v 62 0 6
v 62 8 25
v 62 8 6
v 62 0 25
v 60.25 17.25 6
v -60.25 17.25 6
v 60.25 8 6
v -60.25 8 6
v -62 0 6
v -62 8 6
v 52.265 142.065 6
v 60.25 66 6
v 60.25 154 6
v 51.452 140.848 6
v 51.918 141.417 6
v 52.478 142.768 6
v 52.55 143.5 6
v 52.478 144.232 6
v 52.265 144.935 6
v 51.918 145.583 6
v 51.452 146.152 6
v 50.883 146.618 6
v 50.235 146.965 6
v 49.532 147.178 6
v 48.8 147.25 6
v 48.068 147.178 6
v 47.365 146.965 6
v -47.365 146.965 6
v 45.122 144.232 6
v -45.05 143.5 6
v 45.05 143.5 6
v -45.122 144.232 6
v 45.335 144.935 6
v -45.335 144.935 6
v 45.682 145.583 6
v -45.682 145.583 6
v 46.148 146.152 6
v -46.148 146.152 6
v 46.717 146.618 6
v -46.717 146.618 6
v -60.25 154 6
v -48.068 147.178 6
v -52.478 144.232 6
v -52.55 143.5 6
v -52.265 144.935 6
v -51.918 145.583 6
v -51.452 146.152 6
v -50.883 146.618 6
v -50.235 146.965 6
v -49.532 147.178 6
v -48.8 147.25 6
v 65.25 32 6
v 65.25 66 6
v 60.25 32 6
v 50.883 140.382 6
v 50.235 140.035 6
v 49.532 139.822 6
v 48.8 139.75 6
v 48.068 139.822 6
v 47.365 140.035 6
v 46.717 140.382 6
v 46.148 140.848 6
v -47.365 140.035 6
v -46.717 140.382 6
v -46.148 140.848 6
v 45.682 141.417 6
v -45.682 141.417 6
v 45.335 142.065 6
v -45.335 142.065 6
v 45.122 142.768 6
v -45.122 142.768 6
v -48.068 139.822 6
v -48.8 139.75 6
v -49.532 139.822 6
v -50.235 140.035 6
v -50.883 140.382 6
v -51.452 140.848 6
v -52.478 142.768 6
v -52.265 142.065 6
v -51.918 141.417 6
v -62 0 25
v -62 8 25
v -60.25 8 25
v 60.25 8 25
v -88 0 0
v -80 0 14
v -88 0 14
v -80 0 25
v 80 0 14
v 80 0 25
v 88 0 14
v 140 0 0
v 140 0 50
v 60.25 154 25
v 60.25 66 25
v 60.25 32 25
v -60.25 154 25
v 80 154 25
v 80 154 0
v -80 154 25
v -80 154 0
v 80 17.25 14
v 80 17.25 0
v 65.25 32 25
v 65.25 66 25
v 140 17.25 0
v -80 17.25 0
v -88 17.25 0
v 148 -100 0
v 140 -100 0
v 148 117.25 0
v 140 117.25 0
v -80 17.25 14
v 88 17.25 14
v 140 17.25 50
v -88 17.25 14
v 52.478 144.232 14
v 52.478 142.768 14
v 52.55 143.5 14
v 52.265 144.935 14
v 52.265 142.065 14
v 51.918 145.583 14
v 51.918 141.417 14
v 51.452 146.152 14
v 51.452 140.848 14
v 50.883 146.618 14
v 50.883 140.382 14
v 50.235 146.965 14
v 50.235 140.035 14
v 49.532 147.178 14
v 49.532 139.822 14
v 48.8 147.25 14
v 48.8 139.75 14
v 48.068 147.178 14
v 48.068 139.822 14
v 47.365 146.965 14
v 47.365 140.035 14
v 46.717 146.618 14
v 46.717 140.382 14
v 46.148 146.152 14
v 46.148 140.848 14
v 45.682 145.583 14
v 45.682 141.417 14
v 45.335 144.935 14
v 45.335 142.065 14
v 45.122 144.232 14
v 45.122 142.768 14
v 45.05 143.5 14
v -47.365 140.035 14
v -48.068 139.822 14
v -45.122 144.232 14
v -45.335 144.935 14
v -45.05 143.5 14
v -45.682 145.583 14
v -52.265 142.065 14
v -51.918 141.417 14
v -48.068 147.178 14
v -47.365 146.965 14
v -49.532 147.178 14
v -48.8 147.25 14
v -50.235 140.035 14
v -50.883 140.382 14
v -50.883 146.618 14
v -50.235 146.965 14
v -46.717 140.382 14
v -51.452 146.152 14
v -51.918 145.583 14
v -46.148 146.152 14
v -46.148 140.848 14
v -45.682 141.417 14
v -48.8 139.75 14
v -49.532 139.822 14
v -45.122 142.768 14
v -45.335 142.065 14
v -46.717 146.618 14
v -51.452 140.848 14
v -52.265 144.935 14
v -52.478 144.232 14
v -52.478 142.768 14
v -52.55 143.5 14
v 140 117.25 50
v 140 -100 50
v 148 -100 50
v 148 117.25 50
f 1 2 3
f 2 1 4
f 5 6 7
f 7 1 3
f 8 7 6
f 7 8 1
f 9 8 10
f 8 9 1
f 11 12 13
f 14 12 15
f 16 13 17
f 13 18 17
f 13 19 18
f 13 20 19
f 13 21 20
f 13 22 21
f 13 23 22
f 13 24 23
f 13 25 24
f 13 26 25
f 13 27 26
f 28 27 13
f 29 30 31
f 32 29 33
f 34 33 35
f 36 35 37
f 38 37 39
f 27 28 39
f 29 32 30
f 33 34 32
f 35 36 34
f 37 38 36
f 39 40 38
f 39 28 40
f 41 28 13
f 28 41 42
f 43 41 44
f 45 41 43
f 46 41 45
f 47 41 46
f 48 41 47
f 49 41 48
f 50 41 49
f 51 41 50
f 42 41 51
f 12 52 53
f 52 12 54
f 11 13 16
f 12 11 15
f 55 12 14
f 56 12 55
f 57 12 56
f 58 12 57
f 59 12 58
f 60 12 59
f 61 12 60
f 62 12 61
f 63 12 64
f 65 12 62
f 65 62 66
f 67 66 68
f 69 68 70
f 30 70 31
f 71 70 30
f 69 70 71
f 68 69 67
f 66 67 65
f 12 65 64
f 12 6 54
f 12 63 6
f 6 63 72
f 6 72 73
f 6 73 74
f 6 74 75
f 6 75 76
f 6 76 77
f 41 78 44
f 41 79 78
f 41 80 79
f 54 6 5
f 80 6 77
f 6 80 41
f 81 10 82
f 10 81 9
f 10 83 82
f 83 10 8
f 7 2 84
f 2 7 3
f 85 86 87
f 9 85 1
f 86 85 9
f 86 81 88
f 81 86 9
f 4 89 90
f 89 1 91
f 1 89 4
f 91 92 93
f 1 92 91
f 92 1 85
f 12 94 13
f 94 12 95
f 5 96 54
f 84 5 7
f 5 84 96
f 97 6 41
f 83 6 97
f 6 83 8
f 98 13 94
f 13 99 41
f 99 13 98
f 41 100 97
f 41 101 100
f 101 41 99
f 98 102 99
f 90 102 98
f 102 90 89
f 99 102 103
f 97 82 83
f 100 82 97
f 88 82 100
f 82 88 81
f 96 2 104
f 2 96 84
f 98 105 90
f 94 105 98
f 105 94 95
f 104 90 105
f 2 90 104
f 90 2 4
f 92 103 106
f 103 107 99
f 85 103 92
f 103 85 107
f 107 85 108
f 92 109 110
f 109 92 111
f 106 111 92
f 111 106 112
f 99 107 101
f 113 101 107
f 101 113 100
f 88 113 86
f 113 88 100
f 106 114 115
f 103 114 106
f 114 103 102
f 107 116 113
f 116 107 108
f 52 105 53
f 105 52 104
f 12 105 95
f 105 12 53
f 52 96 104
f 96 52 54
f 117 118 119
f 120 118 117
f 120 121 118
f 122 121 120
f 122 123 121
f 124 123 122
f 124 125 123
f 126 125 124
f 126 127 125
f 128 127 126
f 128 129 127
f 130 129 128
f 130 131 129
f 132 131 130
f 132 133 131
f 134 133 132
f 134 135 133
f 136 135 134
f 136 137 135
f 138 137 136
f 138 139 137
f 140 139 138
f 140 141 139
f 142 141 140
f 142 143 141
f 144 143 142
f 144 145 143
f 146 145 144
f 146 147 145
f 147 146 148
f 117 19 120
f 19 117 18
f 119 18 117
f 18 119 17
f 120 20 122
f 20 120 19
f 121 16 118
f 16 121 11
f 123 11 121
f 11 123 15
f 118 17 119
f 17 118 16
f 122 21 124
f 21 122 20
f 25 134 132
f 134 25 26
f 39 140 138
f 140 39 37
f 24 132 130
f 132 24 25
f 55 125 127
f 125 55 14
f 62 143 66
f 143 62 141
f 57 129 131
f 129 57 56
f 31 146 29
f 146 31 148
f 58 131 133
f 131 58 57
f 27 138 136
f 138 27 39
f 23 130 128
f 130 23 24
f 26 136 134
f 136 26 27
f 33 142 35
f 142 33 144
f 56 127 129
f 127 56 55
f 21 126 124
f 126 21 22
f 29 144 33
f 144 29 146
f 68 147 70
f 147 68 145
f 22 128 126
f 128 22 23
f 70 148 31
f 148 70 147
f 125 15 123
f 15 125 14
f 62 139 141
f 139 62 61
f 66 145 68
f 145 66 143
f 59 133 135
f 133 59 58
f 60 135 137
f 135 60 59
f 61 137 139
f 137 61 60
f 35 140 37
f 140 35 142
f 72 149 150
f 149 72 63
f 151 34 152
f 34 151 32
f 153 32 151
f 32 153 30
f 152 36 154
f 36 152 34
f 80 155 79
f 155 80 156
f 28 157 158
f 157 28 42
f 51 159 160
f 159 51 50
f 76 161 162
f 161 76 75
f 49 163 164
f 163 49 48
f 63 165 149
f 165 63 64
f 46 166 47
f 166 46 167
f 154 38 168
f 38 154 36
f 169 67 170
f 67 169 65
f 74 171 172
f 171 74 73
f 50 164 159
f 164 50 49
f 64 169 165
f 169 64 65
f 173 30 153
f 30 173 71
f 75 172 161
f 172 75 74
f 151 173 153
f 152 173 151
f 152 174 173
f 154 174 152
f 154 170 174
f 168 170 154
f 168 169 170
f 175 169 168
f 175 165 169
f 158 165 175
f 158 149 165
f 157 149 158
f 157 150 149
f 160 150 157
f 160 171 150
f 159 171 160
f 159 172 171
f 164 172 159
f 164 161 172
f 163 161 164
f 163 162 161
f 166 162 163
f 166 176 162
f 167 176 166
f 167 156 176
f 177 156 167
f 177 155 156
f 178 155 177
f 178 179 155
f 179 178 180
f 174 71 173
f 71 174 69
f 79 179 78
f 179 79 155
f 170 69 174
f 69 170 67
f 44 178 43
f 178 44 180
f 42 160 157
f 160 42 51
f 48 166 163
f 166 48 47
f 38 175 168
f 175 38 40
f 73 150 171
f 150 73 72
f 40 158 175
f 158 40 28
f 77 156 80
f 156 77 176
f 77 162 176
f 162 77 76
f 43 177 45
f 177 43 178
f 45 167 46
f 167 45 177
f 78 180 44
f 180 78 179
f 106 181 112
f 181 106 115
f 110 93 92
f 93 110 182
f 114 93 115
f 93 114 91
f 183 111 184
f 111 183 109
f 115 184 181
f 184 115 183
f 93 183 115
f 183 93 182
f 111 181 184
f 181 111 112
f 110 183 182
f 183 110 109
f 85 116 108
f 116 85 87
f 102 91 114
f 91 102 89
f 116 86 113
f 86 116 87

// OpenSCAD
$fn = 32;

front_plate_width = 124;
front_plate_height = 8;

main_plate_width = 120.5;
main_plate_height = 146;

small_pin_diameter = 4.5; 
small_pin_inset_x = 18;
small_pin_inset_y = 19.5;

small_pin_x = front_plate_width * 0.5 - small_pin_inset_x;
small_pin_y = small_pin_inset_y;

large_pin_diameter = 7.5;
large_pin_inset_x = 13.2;
large_pin_inset_y = 10.5;

large_pin_x = front_plate_width * 0.5 - large_pin_inset_x;
large_pin_y = front_plate_height + main_plate_height - large_pin_inset_y;

biscuit_joiner_elevation = 6;

plates_form_height = 50;

jig_block_width = 160;
jig_block_height = main_plate_height + front_plate_height;
jig_block_depth = 25;

pin_height = 8;

jig_fence_rotation_guide_inset_y = 32;
jig_fence_rotation_guide_width = 34;
jig_fence_rotation_guide_thickness = 5;

fence_distance = 140;
fence_thickness = 8;
fence_width = 100;
fence_height = 50;

fence_bracket_width = small_pin_inset_y - 0.5 * small_pin_diameter;
fence_bracket_length = jig_block_width * 0.5 + fence_distance;

fence_bracket_clamp_height = 8;

module jig_block()
{
  translate([0, jig_block_height * 0.5, jig_block_depth * 0.5])
  cube([jig_block_width, jig_block_height, jig_block_depth], center = true);
}

module plates()
{
  translate([0, front_plate_height * 0.5, plates_form_height * 0.5])
  cube([front_plate_width, front_plate_height, plates_form_height], center = true);
  translate([0, front_plate_height + main_plate_height * 0.5, plates_form_height * 0.5])
  cube([main_plate_width, main_plate_height, plates_form_height], center = true);
}

module pins()
{
  pin_geometry_height = pin_height + biscuit_joiner_elevation;
  
  /*
  translate([small_pin_x, small_pin_y, pin_geometry_height * 0.5])
  cylinder(pin_geometry_height, d = small_pin_diameter, center = true);
  translate([-small_pin_x, small_pin_y, pin_geometry_height * 0.5])
  cylinder(pin_geometry_height, d = small_pin_diameter, center = true);
  */

  translate([large_pin_x, large_pin_y, pin_geometry_height * 0.5])
  cylinder(pin_geometry_height, d = large_pin_diameter, center = true);
  translate([-large_pin_x, large_pin_y, pin_geometry_height * 0.5])
  cylinder(pin_geometry_height, d = large_pin_diameter, center = true);
}

module main_jig_piece()
{
  union()
  {
    difference()
    {
      jig_block();
      
      translate([0, 0, biscuit_joiner_elevation])
      plates();

      translate([0.5 * fence_bracket_length - 0.5 * jig_block_width, 0.5 * fence_bracket_width, 0.5 * biscuit_joiner_elevation])
      cube([fence_bracket_length + 2 * fence_thickness, fence_bracket_width, biscuit_joiner_elevation], center = true);

      translate([0.5 * main_plate_width + jig_fence_rotation_guide_thickness * 0.5, 0.5 * jig_fence_rotation_guide_width + jig_fence_rotation_guide_inset_y, 50 + biscuit_joiner_elevation])
      cube([jig_fence_rotation_guide_thickness, jig_fence_rotation_guide_width, 100], center = true);
    }

    pins();
  }
}

module fence()
{
  translate([fence_distance, 0, 0])
  translate([0.5 * fence_thickness, 0.5 * fence_width + 0.5 * fence_bracket_width -0.5 * fence_width, 0.5 * fence_height])
  cube([fence_thickness, 2 * fence_width + fence_bracket_width, fence_height], center = true);
 
  translate([0.5 * fence_bracket_length - 0.5 * jig_block_width, 0.5 * fence_bracket_width, 0.5 * biscuit_joiner_elevation])
  cube([fence_bracket_length + 2 * fence_thickness, fence_bracket_width, biscuit_joiner_elevation], center = true);

  translate([0.5 * fence_thickness + 0.5 * jig_block_width, 0.5 * fence_bracket_width, 0.5 * fence_bracket_clamp_height + biscuit_joiner_elevation])
  cube([fence_thickness, fence_bracket_width, fence_bracket_clamp_height], center = true);
  translate([-0.5 * fence_thickness - 0.5 * jig_block_width, 0.5 * fence_bracket_width, 0.5 * fence_bracket_clamp_height + biscuit_joiner_elevation])
  cube([fence_thickness, fence_bracket_width, fence_bracket_clamp_height], center = true);

  intersection()
  {
    translate([0.5 * jig_block_width + fence_thickness, 0, biscuit_joiner_elevation + fence_bracket_clamp_height])
    multmatrix(
      [[1, 0, 0, 0],
       [0, 1, 0, 0],
       [(fence_height - biscuit_joiner_elevation - fence_bracket_clamp_height) / (fence_distance - 0.5 * jig_block_width - fence_thickness), 0, 1, 0],
       [0, 0, 0, 1]])
    translate([0.5 * (fence_distance - 0.5 * jig_block_width - fence_thickness), 0.5 * fence_bracket_width, -0.5 * (fence_height - biscuit_joiner_elevation - fence_bracket_clamp_height) - 5])
    cube([fence_distance - 0.5 * jig_block_width - fence_thickness, fence_bracket_width, fence_height - biscuit_joiner_elevation - fence_bracket_clamp_height + 10], center = true);

    translate([0, 0, 150])
    cube([300, 300, 300], center = true);
  }
}


color("teal") main_jig_piece();

color("red") fence();
